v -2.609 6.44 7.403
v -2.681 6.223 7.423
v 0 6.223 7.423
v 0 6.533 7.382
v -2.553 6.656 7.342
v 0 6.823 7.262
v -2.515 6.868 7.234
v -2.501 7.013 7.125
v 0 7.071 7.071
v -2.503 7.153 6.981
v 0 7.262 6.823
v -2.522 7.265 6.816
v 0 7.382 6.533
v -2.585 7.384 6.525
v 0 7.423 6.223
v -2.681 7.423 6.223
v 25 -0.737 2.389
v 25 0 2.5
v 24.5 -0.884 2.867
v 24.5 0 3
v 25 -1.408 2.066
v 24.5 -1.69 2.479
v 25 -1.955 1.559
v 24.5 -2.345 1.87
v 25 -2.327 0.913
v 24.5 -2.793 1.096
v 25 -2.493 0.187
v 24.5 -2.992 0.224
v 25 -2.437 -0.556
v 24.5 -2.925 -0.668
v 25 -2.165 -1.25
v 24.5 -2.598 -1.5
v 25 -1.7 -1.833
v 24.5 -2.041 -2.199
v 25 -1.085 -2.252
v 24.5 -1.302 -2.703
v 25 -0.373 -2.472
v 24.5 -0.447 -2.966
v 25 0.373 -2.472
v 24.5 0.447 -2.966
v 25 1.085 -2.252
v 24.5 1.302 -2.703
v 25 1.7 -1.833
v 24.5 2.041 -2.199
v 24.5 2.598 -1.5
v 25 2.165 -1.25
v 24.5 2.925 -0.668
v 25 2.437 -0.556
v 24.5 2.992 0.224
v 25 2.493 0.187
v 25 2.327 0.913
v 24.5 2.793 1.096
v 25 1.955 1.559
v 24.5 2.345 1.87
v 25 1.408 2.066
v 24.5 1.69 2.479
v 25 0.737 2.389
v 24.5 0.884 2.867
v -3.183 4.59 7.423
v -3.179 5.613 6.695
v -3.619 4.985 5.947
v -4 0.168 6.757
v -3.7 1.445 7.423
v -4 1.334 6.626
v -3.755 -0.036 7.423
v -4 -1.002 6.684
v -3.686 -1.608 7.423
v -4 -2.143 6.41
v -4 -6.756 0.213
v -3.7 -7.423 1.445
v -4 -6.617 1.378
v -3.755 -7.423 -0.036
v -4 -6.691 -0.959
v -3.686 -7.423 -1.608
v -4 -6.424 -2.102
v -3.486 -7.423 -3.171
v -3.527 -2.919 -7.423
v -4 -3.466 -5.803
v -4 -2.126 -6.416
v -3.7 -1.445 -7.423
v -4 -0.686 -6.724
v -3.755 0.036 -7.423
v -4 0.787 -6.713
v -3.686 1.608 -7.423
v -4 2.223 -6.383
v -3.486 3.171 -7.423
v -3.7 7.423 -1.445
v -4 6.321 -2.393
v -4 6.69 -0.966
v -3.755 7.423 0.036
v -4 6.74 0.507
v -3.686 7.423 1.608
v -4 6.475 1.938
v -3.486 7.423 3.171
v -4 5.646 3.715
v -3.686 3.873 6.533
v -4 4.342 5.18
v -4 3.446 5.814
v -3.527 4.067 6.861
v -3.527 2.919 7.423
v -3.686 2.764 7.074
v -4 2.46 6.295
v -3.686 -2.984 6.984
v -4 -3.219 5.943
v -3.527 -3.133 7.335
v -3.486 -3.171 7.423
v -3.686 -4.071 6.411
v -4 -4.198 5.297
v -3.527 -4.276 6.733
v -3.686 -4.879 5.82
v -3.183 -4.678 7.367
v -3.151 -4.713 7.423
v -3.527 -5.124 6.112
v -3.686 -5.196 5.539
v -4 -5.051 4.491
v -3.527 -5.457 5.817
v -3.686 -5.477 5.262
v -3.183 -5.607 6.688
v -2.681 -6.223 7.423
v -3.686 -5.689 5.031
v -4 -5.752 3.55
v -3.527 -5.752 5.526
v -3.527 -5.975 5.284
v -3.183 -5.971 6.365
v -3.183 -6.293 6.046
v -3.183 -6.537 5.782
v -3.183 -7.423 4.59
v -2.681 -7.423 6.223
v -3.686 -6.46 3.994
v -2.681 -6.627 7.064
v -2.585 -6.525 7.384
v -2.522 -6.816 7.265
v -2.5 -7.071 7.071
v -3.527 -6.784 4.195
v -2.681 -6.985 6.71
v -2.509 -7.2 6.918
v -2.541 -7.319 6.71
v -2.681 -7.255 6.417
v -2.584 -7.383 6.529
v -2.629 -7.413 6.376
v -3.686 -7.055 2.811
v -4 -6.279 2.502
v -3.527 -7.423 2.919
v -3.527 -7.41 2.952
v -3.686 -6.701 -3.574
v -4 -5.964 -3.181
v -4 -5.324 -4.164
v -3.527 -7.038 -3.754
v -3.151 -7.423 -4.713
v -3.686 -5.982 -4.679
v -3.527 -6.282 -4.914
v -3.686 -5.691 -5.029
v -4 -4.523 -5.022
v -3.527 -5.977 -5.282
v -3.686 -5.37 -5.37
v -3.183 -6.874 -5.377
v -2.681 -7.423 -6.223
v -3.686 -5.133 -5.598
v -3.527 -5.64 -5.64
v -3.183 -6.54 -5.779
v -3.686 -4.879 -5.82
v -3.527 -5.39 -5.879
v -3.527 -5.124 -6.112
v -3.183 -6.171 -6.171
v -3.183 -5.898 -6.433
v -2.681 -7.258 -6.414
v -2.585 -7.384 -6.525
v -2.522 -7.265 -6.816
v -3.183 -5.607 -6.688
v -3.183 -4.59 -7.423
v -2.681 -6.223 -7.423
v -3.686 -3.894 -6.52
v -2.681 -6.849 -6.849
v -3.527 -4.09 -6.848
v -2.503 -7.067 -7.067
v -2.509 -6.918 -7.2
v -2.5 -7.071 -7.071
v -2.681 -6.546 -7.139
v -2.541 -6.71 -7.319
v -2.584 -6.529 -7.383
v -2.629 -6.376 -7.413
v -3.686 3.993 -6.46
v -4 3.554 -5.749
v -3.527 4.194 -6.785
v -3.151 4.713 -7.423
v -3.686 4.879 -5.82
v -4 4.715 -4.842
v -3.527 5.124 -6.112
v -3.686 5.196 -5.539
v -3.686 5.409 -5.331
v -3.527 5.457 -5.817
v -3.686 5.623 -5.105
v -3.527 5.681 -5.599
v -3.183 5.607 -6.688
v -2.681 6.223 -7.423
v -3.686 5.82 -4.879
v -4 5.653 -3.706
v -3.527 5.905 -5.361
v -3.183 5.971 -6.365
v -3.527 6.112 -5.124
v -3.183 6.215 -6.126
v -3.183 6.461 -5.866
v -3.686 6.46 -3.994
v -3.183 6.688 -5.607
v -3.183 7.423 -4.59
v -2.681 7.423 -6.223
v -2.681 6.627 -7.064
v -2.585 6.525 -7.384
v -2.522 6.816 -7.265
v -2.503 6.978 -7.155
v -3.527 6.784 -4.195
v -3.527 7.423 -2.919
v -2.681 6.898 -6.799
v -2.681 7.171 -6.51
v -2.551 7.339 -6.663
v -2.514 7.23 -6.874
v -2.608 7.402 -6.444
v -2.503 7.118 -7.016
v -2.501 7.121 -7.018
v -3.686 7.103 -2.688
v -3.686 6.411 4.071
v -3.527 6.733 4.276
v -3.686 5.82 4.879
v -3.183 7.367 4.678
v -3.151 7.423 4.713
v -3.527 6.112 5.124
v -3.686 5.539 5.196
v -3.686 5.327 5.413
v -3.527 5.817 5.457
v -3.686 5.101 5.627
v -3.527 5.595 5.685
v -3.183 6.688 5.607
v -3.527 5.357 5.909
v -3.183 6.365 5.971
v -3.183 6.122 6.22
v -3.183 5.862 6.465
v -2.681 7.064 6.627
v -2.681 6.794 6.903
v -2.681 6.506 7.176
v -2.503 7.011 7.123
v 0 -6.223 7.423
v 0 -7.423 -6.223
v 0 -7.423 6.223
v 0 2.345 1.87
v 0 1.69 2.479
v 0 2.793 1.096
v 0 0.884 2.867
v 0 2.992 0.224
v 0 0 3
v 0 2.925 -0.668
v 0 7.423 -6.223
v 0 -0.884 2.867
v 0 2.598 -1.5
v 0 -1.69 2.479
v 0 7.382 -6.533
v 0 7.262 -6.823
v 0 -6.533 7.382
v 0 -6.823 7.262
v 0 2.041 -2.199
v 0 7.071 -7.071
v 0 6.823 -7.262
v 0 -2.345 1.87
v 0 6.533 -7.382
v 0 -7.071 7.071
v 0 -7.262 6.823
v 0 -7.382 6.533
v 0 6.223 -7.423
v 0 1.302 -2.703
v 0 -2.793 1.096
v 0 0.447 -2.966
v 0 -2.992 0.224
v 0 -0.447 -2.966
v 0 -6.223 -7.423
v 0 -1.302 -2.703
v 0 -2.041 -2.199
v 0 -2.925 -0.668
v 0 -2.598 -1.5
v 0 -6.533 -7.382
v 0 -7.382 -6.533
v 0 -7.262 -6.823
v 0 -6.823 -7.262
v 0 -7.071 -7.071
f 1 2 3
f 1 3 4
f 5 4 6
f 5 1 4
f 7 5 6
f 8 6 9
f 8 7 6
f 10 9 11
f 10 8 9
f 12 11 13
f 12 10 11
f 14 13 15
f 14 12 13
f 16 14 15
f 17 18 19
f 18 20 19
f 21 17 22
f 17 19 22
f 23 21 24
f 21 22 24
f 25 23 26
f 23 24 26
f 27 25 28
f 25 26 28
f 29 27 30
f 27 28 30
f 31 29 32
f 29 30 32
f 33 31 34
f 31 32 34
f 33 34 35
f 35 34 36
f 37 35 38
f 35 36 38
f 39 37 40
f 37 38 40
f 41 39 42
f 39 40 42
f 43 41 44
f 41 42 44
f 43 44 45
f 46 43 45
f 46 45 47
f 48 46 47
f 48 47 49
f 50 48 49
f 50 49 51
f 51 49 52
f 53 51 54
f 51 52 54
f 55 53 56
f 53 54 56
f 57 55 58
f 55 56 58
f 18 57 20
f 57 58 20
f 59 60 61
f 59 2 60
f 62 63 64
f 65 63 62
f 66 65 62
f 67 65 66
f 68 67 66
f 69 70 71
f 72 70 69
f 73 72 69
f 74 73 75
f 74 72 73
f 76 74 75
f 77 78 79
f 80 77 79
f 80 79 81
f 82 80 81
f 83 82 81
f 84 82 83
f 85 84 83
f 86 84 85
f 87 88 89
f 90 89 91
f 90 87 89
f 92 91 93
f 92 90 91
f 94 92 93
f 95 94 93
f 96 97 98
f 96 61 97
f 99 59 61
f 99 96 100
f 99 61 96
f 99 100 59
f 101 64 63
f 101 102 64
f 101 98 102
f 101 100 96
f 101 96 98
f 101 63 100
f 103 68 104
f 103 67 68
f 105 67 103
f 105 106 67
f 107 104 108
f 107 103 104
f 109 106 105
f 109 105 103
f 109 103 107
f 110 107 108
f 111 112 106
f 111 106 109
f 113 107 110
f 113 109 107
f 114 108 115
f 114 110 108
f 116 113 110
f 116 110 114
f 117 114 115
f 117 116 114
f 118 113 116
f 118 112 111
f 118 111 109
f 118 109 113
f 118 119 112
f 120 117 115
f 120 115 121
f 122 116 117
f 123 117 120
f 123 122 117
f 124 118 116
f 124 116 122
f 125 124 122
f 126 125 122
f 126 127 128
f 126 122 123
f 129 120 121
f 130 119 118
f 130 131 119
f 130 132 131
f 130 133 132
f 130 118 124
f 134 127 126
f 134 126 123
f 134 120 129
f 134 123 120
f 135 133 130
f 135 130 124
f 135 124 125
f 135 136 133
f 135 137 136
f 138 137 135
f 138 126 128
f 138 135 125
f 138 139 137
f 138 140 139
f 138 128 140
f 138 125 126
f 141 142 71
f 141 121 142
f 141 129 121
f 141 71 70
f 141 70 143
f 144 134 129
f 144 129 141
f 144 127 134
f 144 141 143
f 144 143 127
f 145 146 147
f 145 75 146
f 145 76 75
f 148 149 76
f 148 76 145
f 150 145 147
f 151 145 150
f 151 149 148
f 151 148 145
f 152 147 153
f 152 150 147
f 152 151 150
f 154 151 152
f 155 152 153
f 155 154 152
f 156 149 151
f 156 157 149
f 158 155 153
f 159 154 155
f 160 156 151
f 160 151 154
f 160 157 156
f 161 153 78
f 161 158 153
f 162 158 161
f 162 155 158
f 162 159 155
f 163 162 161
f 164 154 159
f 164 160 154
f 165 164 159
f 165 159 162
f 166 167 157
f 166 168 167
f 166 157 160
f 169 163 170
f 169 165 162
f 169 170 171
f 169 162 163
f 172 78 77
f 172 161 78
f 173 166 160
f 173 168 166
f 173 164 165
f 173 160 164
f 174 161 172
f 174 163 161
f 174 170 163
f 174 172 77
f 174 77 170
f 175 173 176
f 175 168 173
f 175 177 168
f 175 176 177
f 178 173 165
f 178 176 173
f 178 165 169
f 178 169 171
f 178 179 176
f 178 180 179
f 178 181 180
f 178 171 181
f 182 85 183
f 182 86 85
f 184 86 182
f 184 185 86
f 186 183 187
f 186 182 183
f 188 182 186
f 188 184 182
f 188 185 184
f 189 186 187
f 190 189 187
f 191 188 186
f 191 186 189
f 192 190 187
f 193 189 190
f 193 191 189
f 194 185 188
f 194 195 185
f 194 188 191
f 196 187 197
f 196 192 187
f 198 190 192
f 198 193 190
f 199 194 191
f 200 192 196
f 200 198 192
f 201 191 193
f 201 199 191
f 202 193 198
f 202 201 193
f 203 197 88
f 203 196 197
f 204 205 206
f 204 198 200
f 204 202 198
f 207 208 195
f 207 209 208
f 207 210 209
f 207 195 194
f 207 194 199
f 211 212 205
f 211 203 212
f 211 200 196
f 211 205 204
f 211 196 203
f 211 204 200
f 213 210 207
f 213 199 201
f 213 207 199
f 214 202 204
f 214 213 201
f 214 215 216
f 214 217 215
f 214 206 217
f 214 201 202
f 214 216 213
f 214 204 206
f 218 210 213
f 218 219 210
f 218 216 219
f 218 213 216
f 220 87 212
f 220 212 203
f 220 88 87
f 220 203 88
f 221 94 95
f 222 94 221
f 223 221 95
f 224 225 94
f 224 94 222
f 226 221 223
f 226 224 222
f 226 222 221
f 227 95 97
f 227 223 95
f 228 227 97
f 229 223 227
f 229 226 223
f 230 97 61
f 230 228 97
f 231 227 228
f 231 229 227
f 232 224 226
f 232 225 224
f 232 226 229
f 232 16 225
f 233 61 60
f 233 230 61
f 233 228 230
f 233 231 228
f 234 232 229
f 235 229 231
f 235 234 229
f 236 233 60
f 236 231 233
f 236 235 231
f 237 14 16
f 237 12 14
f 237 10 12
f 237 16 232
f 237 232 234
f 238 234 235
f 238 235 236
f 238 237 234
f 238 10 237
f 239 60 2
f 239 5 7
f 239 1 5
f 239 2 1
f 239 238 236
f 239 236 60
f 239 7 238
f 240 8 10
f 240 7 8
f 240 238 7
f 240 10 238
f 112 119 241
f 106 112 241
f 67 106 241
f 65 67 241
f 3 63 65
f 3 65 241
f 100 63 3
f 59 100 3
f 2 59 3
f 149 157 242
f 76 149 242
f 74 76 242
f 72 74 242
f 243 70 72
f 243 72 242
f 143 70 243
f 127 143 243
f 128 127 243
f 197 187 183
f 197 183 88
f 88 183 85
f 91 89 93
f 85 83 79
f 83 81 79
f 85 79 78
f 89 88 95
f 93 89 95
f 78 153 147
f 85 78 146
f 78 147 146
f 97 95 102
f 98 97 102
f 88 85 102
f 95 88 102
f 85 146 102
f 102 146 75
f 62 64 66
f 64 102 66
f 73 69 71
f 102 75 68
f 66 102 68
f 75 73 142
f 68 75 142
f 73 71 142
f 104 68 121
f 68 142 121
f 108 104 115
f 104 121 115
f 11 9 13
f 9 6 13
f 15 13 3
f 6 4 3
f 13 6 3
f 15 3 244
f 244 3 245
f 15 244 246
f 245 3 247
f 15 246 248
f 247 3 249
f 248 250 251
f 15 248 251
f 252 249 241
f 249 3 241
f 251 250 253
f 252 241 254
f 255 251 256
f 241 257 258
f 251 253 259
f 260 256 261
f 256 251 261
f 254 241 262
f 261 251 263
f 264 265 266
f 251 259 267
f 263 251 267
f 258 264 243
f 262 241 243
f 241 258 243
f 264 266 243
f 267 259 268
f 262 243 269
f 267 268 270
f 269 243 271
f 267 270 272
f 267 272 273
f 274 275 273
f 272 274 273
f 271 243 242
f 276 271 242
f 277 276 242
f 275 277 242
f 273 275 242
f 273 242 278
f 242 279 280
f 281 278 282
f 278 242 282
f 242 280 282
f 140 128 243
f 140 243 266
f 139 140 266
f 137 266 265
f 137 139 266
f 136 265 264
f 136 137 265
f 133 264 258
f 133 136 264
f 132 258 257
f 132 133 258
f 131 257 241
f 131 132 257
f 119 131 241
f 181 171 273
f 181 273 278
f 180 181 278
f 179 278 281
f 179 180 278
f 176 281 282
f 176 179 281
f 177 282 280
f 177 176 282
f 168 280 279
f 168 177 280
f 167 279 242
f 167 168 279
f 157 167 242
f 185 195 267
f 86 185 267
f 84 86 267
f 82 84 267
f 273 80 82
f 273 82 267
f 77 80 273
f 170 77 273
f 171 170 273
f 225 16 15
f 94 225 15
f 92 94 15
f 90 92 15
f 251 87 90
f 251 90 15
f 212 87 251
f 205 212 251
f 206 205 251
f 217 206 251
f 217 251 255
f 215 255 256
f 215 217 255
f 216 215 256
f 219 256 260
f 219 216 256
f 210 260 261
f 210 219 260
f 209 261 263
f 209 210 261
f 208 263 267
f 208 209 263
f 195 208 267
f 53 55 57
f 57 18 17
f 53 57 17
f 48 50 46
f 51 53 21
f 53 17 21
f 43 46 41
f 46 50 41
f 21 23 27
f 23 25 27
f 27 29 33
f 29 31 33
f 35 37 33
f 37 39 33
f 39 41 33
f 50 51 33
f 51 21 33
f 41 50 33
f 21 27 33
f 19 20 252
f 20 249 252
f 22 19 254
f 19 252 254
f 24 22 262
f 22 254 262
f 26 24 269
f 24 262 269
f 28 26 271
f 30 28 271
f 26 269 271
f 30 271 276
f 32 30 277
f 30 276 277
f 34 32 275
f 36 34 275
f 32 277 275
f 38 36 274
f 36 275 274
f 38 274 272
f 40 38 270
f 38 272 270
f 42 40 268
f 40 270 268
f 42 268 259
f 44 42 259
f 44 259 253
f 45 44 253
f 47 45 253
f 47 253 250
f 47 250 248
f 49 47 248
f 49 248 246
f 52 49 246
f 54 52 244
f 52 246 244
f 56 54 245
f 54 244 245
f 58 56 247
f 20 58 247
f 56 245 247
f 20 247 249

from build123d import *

# Parameters (mm, degrees)
ESQUISSE2_R             = 12.439656977
ENL_V_MAT_EXTRU_1_DEPTH = 33.26453161


with BuildPart() as part:
    # Esquisse1 → Révolution1 (revolve)
    with BuildSketch(Plane.XY):
        Polygon((0, 3), (0, 10), (-4, 10), (-4, 0), (25, 0), (25, 2.5), (24.5, 3), align=None)
    revolve(axis=Axis((-17.165934066, 0, 0), (1, 0, 0)))

    # Esquisse2 → Enlèv. mat.-Extru.1 (cut, through all)
    with BuildSketch(Plane.ZY.offset(4)):
        Circle(ESQUISSE2_R)
        with BuildLine():
            Line((6.222539674, 7.422539674), (-6.222539674, 7.422539674))
            ThreePointArc((-6.222539674, 7.422539674), (-7.071067812, 7.071067812), (-7.422539674, 6.222539674))
            Line((-7.422539674, 6.222539674), (-7.422539674, -6.222539674))
            ThreePointArc((-7.422539674, -6.222539674), (-7.071067812, -7.071067812), (-6.222539674, -7.422539674))
            Line((-6.222539674, -7.422539674), (6.222539674, -7.422539674))
            ThreePointArc((6.222539674, -7.422539674), (7.071067812, -7.071067812), (7.422539674, -6.222539674))
            Line((7.422539674, -6.222539674), (7.422539674, 6.222539674))
            ThreePointArc((7.422539674, 6.222539674), (7.071067812, 7.071067812), (6.222539674, 7.422539674))
        make_face(mode=Mode.SUBTRACT)
    extrude(amount=-ENL_V_MAT_EXTRU_1_DEPTH, mode=Mode.SUBTRACT)

    # Esquisse3 → Enlèvement de matière-Révolution1 (revolve, cut)
    with BuildSketch(Plane.XY):
        with BuildLine():
            Line((-2.5, 10), (-4.5, 10))
            Line((-4.5, 10), (-4.5, 5.049826293))
            ThreePointArc((-4.5, 5.049826293), (-3.684552713, 7.599477283), (-2.5, 10))
        make_face()
    revolve(axis=Axis((-8.516023748, 0, 0), (1, 0, 0)), mode=Mode.SUBTRACT)


solid = part.part
